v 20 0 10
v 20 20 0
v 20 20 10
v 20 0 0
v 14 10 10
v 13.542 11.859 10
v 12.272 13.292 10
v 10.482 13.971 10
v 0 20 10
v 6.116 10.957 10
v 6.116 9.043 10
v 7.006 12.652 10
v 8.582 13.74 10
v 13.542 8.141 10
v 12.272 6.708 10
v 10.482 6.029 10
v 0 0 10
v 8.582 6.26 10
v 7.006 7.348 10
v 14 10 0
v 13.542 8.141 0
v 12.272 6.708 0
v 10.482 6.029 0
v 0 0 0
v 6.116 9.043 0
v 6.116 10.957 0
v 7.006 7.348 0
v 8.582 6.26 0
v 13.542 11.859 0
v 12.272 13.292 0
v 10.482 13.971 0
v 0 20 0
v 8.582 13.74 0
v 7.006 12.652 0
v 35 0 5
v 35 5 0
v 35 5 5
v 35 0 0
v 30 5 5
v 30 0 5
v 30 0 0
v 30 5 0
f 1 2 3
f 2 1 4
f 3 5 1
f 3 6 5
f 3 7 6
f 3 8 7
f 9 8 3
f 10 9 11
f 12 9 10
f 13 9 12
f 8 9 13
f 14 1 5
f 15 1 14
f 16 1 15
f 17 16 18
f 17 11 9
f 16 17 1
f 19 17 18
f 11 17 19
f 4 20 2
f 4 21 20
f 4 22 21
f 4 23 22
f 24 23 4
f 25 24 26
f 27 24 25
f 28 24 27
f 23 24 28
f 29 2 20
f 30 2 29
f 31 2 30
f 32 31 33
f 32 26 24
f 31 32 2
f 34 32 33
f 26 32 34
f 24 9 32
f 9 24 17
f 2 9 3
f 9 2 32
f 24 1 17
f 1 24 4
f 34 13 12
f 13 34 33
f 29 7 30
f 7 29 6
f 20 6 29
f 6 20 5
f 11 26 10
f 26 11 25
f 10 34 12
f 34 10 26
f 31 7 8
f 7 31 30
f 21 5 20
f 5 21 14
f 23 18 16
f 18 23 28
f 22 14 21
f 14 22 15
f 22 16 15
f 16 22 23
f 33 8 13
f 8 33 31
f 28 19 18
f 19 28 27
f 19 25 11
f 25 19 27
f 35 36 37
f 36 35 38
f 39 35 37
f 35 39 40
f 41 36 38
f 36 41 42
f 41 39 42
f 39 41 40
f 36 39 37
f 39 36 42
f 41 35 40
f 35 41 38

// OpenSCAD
// Purpose: modifiers – # highlights (stays in the result), % is helper geometry, * is not shown.
difference() {
    cube([20, 20, 10]);
    # translate([10, 10, -1]) cylinder(h = 12, r = 4);
}
% translate([0, 0, 10]) cube([20, 20, 1]);      // Lid only for illustration
* translate([30, 0, 0]) sphere(10);             // switched off
translate([30, 0, 0]) cube(5);
